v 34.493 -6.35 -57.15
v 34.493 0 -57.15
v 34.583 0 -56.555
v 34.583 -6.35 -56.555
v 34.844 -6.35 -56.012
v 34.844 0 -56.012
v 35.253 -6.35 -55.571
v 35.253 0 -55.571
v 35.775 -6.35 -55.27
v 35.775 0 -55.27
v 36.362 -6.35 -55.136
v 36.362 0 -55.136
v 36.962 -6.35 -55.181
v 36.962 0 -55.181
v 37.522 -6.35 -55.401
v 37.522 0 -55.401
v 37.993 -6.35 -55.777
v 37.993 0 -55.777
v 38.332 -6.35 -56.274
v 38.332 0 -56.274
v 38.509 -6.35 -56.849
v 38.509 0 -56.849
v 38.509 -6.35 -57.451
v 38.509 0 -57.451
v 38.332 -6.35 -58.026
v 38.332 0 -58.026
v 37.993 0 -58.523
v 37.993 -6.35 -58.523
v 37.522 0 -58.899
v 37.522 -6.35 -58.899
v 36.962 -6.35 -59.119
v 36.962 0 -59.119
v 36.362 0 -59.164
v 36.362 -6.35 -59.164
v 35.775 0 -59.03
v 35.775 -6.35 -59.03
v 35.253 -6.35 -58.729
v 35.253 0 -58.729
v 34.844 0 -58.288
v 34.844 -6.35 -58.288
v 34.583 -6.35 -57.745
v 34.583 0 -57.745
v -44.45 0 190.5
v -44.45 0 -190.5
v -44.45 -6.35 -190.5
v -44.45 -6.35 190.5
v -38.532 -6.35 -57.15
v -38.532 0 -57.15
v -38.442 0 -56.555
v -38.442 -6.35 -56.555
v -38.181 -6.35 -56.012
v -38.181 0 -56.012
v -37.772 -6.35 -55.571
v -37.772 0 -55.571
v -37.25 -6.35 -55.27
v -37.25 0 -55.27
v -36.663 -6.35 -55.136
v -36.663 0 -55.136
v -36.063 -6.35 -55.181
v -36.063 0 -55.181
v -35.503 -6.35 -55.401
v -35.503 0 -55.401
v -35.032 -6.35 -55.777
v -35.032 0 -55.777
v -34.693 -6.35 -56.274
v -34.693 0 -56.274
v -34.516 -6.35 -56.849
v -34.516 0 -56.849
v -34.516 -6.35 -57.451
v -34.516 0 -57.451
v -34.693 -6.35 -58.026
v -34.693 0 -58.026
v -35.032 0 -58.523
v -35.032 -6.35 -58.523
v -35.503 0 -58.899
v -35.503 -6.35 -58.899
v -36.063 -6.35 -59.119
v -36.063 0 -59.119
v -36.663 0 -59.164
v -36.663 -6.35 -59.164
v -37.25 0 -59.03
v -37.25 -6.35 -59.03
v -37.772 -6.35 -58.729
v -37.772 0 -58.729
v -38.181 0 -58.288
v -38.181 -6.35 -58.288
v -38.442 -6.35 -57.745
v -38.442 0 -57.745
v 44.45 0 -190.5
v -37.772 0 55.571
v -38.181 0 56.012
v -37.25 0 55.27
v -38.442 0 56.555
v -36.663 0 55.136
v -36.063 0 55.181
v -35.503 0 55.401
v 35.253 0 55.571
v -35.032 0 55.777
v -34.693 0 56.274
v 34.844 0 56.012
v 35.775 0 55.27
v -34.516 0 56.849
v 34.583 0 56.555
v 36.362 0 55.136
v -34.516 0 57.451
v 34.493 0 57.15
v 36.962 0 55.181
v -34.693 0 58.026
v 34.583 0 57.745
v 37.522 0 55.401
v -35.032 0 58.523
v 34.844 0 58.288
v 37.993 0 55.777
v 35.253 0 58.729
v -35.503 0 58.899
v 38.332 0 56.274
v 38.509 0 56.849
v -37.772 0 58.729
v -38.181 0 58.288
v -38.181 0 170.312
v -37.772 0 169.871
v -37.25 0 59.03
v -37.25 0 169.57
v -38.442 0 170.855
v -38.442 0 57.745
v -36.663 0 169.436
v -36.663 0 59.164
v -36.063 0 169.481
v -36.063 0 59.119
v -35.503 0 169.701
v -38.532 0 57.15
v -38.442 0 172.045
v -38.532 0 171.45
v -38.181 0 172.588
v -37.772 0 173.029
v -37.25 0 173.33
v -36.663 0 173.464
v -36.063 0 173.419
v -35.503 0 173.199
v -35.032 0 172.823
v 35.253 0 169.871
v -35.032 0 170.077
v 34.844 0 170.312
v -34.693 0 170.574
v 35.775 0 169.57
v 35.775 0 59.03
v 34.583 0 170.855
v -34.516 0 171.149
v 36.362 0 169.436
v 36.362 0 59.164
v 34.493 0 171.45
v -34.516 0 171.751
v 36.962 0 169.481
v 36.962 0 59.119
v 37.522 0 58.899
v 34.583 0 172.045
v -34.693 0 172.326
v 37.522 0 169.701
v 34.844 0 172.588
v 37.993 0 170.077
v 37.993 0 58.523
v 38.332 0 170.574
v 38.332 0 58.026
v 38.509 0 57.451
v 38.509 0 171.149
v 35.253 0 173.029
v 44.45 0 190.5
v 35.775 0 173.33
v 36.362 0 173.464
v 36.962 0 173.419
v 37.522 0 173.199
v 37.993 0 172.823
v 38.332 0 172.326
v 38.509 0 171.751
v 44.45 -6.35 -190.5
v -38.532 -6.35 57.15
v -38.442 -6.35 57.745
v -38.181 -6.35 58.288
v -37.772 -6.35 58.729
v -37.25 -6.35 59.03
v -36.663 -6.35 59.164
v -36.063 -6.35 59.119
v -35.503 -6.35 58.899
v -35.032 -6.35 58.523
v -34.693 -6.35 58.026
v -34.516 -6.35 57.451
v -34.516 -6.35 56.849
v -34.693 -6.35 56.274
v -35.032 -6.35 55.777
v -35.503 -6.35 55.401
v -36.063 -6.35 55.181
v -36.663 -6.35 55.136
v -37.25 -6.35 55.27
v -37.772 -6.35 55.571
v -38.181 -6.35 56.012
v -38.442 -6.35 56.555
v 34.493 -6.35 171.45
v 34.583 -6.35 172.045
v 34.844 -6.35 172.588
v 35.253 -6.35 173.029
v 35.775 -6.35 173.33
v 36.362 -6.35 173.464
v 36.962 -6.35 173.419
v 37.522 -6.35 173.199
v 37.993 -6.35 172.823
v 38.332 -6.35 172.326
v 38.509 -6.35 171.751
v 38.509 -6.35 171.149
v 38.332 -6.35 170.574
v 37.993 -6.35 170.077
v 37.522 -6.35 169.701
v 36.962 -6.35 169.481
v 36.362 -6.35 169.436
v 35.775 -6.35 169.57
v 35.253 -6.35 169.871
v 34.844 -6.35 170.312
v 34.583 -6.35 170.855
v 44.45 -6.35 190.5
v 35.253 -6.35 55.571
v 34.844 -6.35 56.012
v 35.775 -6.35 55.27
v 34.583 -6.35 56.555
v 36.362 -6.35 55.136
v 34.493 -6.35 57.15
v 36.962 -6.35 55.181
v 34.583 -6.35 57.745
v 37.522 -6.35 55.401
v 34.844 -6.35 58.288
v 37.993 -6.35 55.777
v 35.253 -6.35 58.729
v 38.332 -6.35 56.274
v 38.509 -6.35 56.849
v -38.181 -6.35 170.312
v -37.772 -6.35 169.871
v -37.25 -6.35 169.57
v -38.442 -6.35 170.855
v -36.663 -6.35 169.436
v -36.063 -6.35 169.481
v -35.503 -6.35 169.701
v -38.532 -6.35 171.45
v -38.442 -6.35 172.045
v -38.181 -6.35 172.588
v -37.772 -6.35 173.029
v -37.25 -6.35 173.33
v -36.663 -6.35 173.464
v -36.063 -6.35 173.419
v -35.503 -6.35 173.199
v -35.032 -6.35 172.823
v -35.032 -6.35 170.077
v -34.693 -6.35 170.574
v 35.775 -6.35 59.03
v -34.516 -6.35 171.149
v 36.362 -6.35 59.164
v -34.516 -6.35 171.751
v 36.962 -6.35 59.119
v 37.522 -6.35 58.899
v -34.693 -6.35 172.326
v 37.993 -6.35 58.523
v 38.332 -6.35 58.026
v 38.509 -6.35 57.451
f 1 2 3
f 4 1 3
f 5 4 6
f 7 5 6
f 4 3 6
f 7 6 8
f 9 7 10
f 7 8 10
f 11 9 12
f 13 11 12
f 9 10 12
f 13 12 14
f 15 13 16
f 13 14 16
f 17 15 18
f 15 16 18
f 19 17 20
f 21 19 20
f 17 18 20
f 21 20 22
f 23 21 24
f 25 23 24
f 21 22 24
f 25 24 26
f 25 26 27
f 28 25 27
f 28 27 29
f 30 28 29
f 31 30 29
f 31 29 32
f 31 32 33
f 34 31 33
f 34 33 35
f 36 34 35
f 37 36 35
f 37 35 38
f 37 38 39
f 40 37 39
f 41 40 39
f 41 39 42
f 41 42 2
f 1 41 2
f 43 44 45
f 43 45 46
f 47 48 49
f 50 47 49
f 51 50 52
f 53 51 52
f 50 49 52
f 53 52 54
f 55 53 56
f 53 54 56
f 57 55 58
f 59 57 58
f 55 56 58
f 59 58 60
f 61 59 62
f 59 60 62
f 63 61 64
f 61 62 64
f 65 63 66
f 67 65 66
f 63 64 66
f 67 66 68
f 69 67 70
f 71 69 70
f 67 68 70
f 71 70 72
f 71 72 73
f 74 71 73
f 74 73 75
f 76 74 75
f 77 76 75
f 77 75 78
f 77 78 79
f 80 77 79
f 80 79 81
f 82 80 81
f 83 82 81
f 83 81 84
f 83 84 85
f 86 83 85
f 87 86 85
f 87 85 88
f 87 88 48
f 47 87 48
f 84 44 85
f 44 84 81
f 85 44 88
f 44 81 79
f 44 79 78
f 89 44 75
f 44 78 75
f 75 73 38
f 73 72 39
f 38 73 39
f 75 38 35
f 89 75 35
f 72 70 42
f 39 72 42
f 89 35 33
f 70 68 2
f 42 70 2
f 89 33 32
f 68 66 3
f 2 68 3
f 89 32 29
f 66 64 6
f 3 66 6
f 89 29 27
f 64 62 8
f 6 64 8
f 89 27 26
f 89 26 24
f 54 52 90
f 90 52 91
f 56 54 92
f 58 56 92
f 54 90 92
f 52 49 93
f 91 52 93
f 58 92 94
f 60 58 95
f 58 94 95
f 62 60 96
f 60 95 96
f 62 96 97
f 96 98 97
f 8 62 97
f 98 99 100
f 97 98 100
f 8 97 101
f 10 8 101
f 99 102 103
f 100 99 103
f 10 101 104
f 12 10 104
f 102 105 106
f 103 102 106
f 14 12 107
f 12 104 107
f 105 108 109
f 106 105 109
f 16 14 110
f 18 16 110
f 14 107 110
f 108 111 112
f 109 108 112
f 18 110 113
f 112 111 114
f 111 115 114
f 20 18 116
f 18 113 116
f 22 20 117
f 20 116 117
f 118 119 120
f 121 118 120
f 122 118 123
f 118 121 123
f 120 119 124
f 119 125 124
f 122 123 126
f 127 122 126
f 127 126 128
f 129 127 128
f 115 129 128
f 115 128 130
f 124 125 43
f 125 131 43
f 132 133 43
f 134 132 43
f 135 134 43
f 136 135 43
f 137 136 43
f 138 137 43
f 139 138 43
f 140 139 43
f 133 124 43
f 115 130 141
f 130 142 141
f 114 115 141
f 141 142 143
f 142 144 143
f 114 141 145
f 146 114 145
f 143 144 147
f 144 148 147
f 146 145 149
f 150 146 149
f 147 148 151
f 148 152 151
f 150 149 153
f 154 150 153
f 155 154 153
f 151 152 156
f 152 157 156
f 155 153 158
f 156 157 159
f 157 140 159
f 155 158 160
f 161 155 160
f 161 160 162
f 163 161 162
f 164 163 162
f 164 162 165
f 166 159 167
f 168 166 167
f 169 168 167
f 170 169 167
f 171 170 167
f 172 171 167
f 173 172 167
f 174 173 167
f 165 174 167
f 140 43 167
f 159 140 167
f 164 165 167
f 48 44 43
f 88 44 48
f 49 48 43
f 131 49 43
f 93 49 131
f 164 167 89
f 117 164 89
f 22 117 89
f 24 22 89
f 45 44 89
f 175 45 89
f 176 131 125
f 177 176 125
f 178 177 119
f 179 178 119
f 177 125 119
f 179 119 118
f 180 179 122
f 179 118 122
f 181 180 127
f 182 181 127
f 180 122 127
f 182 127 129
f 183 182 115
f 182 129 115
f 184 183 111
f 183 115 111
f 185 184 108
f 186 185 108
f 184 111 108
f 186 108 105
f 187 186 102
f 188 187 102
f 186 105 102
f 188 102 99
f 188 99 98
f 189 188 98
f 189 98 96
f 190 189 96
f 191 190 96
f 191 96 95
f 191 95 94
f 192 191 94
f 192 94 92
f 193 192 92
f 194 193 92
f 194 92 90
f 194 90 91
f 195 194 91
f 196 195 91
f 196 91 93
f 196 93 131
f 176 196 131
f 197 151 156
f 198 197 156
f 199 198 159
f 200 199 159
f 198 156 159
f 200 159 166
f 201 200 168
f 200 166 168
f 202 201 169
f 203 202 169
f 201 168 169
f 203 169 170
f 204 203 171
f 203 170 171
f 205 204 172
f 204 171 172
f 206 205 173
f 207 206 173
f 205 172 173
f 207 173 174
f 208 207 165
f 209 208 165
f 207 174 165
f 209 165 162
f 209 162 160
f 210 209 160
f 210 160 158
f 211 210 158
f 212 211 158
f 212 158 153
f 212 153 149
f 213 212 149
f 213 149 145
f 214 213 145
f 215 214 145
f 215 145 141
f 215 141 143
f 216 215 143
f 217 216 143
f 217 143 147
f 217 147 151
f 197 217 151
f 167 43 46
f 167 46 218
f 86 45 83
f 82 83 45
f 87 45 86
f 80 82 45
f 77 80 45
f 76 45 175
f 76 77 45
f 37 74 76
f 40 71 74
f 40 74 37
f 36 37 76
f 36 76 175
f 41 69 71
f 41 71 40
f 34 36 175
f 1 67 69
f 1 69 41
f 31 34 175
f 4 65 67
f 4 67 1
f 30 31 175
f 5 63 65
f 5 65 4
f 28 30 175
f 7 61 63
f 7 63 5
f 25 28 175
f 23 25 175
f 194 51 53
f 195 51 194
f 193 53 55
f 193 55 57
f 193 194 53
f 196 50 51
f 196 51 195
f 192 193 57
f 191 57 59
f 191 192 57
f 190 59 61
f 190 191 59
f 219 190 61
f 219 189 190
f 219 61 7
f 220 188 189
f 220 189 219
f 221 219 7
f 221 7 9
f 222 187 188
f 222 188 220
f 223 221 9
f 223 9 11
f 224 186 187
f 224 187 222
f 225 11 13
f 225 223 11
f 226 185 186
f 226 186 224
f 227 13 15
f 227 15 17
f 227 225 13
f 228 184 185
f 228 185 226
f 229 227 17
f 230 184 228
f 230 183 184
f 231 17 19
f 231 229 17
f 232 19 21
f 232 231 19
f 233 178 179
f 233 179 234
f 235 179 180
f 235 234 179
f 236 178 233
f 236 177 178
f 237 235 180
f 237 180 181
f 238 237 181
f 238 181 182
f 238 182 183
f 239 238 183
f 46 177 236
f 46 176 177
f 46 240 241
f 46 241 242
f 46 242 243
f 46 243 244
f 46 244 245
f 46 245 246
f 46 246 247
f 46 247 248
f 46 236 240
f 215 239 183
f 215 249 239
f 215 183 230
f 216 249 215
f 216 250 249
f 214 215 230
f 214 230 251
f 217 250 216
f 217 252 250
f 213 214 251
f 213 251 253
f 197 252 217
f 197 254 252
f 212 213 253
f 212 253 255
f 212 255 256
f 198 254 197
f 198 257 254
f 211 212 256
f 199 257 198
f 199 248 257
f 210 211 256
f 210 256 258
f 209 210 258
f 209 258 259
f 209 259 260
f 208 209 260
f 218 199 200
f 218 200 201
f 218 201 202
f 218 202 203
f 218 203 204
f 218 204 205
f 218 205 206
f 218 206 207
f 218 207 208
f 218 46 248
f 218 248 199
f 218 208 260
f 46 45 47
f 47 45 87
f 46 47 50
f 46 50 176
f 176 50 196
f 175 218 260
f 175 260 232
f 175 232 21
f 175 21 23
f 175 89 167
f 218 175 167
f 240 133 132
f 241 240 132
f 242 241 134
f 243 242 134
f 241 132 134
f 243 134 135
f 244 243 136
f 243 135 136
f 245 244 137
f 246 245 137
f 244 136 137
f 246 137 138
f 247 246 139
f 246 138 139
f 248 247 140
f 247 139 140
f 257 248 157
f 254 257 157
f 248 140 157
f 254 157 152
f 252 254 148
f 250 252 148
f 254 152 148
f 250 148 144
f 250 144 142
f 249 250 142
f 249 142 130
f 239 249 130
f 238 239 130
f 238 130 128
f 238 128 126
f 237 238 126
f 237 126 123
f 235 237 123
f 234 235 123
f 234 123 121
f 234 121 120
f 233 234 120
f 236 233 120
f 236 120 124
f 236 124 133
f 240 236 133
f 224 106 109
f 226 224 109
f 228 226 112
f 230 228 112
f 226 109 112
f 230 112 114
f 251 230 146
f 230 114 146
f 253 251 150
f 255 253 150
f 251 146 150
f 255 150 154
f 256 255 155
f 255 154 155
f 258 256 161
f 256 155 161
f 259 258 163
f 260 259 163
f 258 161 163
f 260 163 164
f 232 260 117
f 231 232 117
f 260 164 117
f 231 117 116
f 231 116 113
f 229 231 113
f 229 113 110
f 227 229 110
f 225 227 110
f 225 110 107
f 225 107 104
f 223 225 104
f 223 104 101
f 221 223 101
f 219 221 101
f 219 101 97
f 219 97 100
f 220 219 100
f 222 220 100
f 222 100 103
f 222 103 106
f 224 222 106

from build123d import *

# Parameters (mm, degrees)
F0_W     = 88.9
F0_H     = 381
F1_DEPTH = 6.35
F3_D     = 4.0386


with BuildPart() as f1:
    # F0 (on Front) → F1 (new body)
    with BuildSketch(Plane.XZ):
        Rectangle(F0_W, F0_H)
    extrude(amount=F1_DEPTH)

    # F3 (through all)
    with Locations(Plane.XZ.offset(6.35)):
        with Locations((-36.5125, 171.45), (36.5125, 171.45), (36.5125, 57.15), (-36.5125, 57.15), (-36.5125, -57.15), (36.5125, -57.15)):
            Hole(F3_D / 2)


solid = f1.part
